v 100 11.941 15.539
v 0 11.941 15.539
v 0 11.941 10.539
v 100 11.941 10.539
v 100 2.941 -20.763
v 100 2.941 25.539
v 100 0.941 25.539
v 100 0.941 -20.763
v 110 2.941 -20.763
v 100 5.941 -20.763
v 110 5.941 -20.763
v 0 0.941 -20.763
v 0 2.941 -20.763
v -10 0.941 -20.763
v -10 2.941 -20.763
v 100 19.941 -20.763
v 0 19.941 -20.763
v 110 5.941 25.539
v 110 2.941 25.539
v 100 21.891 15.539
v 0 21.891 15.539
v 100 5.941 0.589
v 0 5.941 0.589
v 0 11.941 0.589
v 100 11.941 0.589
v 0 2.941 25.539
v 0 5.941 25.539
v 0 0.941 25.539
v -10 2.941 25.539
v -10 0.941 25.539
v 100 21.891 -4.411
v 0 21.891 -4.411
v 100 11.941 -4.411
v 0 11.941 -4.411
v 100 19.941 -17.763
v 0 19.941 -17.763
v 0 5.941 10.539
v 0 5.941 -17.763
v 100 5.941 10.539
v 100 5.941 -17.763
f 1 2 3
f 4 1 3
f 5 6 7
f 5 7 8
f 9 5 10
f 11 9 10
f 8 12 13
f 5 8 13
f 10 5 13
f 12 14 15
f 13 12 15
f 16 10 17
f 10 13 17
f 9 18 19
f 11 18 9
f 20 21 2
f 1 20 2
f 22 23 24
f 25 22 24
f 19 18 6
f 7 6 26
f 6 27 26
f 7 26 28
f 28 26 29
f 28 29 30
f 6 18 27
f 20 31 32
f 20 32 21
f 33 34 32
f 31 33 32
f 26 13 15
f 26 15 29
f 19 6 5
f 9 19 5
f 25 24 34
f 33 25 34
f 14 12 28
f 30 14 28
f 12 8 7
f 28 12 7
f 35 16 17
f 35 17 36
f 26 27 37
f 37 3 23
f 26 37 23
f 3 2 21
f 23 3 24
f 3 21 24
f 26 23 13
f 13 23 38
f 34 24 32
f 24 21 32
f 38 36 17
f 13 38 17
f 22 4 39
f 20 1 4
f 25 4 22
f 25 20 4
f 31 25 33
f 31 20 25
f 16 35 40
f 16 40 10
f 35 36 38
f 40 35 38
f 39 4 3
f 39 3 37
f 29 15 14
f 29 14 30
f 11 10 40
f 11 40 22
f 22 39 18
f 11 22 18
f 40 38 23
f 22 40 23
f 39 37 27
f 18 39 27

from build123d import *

# Parameters (mm, degrees)
SKETCH2_W           = 13
SKETCH2_H           = 5
BOSS_EXTRUDE1_DEPTH = 100
SKETCH4_W           = 46.302304271
SKETCH4_H           = 2
BOSS_EXTRUDE2_DEPTH = 10
BOSS_EXTRUDE4_DEPTH = 10


with BuildPart() as part:
    # Sketch2 → Boss-Extrude1 (new body)
    with BuildSketch(Plane(origin=(0, 5.94140841, 0), x_dir=(0, 0, -1), z_dir=(1, 0, 0))):
        Polygon((-0.588894188, 6), (4.411105812, 6), (4.411105812, 15.949875627), (-15.538894188, 15.949875627), (-15.538894188, 5.999875627), (-10.538894188, 5.999875627), (-10.538894188, 0), (-0.588894188, 0), align=None)
        Polygon((20.763410083, 14), (17.763410083, 14), (17.763410083, 0), (17.763410083, -5), (20.763410083, -5), align=None)
        Polygon((-0.588894188, 0), (4.763410083, 0), (4.763410083, -5), (-25.538894188, -5), (-25.538894188, 0), (-10.538894188, 0), align=None)
        with Locations((11.263410083, -2.5)):
            Rectangle(SKETCH2_W, SKETCH2_H)
    extrude(amount=BOSS_EXTRUDE1_DEPTH)

    # Sketch4 → Boss-Extrude2 (add)
    with BuildSketch(Plane.ZY):
        with Locations((2.387742053, 1.94140841)):
            Rectangle(SKETCH4_W, SKETCH4_H)
    extrude(amount=BOSS_EXTRUDE2_DEPTH)

    # Sketch5 → Boss-Extrude4 (add)
    with BuildSketch(Plane(origin=(100, 0, 0), x_dir=(0, 0, -1), z_dir=(1, 0, 0))):
        Polygon((-25.538894188, 5.94140841), (-25.538894188, 2.94140841), (20.763410083, 2.94140841), (20.763410083, 5.94140841), (17.763410083, 5.94140841), (-0.588894188, 5.94140841), (-10.538894188, 5.94140841), align=None)
    extrude(amount=BOSS_EXTRUDE4_DEPTH)


solid = part.part
